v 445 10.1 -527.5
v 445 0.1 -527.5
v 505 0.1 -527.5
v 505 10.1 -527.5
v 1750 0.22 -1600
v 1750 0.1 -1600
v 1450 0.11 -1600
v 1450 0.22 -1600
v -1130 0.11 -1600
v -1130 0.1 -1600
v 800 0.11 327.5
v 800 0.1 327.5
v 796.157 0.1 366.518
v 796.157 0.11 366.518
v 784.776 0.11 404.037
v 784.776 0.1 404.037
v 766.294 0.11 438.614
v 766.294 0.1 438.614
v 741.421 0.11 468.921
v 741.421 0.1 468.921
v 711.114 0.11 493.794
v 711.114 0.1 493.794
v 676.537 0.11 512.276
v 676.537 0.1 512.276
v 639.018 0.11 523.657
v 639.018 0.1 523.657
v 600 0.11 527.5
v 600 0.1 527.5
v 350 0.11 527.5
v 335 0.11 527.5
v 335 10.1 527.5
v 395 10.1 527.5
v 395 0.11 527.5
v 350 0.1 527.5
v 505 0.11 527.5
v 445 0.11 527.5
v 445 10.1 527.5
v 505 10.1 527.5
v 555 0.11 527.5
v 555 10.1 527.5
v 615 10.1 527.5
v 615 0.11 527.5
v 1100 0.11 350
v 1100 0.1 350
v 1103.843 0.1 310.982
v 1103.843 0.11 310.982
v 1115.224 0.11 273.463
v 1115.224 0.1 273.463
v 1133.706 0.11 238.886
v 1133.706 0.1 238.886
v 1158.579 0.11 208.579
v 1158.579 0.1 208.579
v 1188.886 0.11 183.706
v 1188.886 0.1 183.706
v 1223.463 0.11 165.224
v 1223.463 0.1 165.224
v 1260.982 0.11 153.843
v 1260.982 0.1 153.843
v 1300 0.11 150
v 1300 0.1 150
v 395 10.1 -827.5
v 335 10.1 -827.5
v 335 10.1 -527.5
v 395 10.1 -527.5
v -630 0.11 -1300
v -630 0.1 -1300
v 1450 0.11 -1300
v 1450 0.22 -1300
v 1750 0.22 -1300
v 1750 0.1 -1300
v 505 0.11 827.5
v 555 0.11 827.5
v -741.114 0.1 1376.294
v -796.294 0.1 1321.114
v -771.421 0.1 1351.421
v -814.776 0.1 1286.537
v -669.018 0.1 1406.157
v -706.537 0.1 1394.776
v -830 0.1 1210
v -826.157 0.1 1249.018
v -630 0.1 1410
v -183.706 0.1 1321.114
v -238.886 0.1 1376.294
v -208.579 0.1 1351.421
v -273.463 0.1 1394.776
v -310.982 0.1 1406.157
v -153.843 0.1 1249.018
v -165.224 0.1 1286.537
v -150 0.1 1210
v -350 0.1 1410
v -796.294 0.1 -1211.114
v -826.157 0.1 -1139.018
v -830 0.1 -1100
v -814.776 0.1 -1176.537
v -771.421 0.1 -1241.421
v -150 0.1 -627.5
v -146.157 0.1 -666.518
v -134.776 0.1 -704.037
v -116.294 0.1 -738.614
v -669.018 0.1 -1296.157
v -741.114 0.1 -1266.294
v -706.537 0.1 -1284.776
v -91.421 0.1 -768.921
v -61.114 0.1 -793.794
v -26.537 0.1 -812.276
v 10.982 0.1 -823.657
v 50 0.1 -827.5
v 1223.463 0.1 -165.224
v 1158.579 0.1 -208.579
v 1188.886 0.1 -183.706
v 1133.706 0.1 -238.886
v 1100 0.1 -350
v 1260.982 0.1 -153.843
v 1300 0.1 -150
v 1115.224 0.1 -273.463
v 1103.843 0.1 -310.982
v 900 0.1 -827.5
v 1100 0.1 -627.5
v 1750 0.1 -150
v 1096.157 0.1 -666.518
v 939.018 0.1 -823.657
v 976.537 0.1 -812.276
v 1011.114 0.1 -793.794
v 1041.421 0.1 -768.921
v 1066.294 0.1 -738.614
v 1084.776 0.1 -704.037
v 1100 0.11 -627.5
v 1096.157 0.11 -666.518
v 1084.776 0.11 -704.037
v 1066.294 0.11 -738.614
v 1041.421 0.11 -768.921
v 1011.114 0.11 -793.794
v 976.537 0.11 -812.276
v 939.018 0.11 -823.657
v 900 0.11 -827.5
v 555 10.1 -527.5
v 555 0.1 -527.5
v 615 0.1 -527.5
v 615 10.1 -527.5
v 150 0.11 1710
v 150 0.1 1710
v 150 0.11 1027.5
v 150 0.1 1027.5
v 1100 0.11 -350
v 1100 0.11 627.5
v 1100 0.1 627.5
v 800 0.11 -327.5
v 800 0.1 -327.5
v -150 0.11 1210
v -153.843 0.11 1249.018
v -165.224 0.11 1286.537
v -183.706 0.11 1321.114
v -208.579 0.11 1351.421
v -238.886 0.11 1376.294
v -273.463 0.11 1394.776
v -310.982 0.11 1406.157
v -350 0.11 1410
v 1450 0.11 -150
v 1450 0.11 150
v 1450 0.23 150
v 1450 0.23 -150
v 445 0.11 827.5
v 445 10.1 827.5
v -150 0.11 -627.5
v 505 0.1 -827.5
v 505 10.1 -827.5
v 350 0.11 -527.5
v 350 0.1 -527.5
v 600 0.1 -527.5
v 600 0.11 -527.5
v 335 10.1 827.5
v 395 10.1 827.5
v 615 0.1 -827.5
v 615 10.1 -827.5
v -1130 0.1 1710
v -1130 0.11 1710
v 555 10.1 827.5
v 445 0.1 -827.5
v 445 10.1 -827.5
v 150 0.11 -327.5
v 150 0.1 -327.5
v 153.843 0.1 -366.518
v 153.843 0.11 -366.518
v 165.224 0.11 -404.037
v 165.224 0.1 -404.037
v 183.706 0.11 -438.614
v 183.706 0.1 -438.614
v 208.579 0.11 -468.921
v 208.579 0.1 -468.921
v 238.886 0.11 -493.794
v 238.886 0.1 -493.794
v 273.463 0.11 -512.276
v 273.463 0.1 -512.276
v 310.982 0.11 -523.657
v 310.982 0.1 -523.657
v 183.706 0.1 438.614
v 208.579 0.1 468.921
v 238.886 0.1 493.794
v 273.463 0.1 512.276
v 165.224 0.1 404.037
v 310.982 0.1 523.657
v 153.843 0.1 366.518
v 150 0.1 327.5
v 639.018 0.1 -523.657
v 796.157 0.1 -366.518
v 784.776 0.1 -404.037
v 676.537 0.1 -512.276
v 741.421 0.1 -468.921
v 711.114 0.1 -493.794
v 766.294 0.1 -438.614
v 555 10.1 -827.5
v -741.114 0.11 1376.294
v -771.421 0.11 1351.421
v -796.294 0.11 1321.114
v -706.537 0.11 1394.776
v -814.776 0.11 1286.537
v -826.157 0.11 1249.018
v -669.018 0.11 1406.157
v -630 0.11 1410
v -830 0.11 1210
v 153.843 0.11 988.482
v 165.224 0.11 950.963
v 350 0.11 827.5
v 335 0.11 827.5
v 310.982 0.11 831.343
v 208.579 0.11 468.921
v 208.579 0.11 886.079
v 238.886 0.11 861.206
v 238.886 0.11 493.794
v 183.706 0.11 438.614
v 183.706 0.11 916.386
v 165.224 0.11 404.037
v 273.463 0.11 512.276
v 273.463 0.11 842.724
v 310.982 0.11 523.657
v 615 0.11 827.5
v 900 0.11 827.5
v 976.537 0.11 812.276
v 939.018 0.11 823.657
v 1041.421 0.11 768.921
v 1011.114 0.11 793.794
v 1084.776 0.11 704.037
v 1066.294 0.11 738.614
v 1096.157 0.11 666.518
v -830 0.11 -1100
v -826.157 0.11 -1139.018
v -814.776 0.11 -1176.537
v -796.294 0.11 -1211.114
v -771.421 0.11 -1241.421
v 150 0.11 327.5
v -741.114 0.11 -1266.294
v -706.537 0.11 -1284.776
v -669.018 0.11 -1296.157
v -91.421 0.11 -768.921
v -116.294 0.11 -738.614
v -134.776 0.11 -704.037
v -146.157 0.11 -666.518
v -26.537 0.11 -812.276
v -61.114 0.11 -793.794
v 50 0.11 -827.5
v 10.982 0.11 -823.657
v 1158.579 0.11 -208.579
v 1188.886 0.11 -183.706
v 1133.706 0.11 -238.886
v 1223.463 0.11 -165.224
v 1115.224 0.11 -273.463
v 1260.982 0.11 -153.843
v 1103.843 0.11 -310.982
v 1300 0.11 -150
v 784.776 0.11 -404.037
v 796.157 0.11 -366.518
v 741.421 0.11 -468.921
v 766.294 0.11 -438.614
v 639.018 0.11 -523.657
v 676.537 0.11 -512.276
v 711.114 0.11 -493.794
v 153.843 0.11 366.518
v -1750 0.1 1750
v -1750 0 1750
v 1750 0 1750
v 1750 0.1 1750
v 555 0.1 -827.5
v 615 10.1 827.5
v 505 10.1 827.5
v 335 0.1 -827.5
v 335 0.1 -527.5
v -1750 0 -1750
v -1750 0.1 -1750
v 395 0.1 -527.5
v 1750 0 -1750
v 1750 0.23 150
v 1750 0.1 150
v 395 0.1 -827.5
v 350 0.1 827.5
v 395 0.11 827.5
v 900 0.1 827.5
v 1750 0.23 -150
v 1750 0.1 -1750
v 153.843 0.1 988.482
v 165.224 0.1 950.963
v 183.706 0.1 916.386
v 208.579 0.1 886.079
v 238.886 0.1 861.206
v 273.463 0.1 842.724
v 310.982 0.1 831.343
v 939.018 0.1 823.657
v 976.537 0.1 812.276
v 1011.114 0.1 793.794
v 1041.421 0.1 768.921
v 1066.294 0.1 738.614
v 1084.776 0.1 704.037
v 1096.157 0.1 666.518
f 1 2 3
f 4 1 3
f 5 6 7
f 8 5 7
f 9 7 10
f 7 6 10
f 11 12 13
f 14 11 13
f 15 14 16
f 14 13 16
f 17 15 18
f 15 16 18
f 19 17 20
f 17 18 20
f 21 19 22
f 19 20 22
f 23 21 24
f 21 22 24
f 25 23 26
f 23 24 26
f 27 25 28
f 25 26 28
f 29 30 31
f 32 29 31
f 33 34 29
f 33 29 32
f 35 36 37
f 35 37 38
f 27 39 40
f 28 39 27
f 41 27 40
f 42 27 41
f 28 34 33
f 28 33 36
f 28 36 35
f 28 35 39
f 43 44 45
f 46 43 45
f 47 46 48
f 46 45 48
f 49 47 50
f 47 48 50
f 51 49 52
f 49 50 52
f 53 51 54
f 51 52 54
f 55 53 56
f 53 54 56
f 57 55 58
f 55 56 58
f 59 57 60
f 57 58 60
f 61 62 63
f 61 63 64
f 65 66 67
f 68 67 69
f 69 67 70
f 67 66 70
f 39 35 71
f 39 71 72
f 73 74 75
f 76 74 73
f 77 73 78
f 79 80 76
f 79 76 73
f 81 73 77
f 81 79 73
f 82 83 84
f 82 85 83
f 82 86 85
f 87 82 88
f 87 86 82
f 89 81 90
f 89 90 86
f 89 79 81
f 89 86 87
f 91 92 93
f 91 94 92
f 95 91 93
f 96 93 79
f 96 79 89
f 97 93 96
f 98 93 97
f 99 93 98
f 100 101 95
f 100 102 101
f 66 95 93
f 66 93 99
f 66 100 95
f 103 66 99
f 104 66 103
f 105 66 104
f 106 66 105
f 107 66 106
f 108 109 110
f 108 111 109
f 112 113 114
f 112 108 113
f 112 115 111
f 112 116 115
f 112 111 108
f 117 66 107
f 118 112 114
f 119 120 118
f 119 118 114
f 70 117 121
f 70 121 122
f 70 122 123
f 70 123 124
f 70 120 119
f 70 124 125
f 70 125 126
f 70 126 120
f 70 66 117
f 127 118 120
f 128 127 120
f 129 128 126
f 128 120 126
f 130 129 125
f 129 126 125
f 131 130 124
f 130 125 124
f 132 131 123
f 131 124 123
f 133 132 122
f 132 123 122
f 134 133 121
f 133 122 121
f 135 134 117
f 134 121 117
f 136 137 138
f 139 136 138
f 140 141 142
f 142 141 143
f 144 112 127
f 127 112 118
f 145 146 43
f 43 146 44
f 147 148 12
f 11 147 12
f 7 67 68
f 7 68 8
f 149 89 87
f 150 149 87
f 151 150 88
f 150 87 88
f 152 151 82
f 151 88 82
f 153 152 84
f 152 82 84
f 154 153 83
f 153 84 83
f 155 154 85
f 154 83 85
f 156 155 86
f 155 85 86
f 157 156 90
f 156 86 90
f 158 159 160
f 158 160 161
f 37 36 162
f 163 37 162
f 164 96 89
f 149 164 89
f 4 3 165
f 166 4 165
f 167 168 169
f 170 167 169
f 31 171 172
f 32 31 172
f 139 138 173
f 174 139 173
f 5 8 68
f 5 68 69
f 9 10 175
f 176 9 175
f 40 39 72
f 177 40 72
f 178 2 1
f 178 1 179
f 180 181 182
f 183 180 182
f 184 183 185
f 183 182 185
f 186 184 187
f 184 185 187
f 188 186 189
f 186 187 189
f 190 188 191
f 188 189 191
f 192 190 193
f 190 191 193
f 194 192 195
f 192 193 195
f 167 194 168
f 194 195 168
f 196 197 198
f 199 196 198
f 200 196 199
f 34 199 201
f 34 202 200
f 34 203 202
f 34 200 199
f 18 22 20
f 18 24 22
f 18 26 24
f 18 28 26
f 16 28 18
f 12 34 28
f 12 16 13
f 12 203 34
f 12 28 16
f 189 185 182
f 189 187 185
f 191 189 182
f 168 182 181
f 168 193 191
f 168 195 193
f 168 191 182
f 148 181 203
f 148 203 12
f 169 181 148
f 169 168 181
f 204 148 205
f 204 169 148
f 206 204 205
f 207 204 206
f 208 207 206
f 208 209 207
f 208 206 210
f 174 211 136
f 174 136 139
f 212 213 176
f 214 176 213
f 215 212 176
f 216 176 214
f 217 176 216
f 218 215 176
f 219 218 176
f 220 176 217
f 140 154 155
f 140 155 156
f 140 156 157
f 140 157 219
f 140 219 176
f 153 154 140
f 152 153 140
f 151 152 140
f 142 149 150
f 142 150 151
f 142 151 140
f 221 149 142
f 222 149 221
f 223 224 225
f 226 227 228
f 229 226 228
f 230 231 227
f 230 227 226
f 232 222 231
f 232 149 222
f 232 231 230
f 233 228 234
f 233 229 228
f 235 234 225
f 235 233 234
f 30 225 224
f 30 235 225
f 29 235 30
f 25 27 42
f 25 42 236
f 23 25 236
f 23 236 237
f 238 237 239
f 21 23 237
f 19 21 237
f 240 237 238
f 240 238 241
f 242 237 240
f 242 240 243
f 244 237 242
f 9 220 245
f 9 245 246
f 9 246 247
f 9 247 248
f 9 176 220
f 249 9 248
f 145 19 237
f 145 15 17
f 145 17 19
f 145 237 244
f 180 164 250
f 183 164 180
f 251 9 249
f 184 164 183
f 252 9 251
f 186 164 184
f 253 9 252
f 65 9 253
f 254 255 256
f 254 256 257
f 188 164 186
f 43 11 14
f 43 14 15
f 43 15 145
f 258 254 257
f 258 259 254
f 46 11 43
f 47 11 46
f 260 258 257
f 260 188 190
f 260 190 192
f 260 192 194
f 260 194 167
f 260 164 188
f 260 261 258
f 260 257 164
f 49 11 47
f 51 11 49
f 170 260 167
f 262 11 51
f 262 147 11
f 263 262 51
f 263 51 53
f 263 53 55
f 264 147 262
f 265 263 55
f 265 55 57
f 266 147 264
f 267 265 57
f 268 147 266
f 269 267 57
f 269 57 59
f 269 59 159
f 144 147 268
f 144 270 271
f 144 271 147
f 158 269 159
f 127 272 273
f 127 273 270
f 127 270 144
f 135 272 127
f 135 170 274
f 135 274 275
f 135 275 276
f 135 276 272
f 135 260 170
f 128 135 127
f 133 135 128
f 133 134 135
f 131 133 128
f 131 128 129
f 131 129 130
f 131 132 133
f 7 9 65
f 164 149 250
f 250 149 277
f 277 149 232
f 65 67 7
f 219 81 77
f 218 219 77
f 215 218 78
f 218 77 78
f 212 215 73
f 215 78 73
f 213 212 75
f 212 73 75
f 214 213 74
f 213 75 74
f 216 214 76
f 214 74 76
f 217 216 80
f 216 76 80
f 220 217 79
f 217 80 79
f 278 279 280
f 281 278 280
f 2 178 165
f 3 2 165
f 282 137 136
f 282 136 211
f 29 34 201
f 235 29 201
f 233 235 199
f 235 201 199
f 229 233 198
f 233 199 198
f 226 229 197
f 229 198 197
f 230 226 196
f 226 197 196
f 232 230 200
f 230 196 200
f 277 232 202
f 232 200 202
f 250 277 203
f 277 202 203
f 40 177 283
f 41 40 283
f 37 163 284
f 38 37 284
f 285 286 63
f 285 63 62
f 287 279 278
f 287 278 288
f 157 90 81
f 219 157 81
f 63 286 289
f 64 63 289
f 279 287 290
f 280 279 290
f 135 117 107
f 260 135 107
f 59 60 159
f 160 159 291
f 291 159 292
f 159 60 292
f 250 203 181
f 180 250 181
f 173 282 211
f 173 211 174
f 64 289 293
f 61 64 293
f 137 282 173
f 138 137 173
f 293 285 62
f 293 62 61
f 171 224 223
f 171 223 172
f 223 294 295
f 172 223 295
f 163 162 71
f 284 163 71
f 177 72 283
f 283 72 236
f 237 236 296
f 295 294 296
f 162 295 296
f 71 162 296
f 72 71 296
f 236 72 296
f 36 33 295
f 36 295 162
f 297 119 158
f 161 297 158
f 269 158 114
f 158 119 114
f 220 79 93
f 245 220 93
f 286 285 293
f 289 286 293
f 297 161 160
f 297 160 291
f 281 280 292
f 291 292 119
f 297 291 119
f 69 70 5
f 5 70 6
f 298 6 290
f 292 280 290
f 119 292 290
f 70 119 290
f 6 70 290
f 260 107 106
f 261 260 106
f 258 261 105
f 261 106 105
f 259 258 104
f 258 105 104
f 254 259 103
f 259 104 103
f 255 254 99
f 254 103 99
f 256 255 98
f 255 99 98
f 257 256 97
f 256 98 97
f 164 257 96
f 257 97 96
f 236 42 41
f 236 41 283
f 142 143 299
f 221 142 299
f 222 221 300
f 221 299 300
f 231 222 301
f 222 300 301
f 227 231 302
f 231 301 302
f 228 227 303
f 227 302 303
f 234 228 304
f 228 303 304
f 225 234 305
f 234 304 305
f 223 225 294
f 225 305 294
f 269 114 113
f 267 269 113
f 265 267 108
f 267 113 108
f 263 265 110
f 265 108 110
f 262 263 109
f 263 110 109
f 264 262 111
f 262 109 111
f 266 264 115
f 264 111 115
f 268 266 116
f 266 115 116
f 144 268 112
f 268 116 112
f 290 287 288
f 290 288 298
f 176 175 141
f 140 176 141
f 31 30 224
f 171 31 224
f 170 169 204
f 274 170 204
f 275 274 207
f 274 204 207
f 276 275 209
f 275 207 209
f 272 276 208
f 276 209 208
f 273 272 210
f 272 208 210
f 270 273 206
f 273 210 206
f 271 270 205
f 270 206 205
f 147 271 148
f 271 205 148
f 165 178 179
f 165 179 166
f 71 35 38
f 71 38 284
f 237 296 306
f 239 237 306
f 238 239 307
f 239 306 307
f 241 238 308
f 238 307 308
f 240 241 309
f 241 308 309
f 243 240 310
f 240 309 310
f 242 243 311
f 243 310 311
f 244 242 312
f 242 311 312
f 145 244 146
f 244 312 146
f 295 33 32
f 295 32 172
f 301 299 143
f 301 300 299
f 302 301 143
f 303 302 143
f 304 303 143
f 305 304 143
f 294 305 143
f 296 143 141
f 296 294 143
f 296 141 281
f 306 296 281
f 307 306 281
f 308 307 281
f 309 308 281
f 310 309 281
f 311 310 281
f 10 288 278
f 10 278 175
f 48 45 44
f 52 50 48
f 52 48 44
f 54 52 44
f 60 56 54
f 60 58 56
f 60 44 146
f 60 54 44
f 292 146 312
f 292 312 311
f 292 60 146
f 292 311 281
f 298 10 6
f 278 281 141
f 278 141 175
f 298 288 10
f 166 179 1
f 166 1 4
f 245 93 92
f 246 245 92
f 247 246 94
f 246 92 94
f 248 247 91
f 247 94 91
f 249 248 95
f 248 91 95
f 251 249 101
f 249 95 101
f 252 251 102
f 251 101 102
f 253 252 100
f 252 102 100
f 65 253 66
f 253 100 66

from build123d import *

# Parameters (mm, degrees)
SKETCH_2_W        = 3500
SKETCH_2_H        = 3500
EXTRUDE_1_DEPTH   = 0.1
EXTRUDE_3_DEPTH   = 0.11
SKETCH_4_W        = 300
SKETCH_4_H        = 300
EXTRUDE_4_DEPTH   = 0.12
SKETCH_5_W        = 300
SKETCH_5_H        = 300
EXTRUDE_5_DEPTH   = 0.13
SKETCH_6_W        = 60
SKETCH_6_H        = 300
EXTRUDE_6_DEPTH   = 10
EXTRUDE_6_2_DEPTH = 10
EXTRUDE_6_3_DEPTH = 10


with BuildPart() as part:
    # 草图2 → 凸台-拉伸1 (new body)
    with BuildSketch(Plane(origin=(0, 0, 0), x_dir=(1, 0, 0), z_dir=(0, 1, 0))):
        Rectangle(SKETCH_2_W, SKETCH_2_H)
    extrude(amount=EXTRUDE_1_DEPTH)

    # 草图3 → 凸台-拉伸3 (add)
    with BuildSketch(Plane(origin=(0, 0, 0), x_dir=(1, 0, 0), z_dir=(0, 1, 0))):
        with BuildLine():
            Line((1750, 1600), (-1130, 1600))
            Line((-1130, 1600), (-1130, -1710))
            Line((-1130, -1710), (150, -1710))
            Line((150, -1710), (150, -1027.5))
            ThreePointArc((150, -1027.5), (208.578643763, -886.078643763), (350, -827.5))
            Line((350, -827.5), (900, -827.5))
            ThreePointArc((900, -827.5), (1041.421356237, -768.921356237), (1100, -627.5))
            Line((1100, -627.5), (1100, -350))
            ThreePointArc((1100, -350), (1158.578643763, -208.578643763), (1300, -150))
            Line((1300, -150), (1750, -150))
            Line((1750, -150), (1750, 150))
            Line((1750, 150), (1300, 150))
            ThreePointArc((1300, 150), (1158.578643763, 208.578643763), (1100, 350))
            Line((1100, 350), (1100, 627.5))
            ThreePointArc((1100, 627.5), (1041.421356237, 768.921356237), (900, 827.5))
            Line((900, 827.5), (50, 827.5))
            ThreePointArc((50, 827.5), (-91.421356237, 768.921356237), (-150, 627.5))
            Line((-150, 627.5), (-150, -1210))
            ThreePointArc((-150, -1210), (-208.578643763, -1351.421356237), (-350, -1410))
            Line((-350, -1410), (-630, -1410))
            ThreePointArc((-630, -1410), (-771.421356237, -1351.421356237), (-830, -1210))
            Line((-830, -1210), (-830, 1100))
            ThreePointArc((-830, 1100), (-771.421356237, 1241.421356237), (-630, 1300))
            Line((-630, 1300), (1750, 1300))
            Line((1750, 1300), (1750, 1600))
        make_face()
        with BuildLine():
            Line((350, 527.5), (600, 527.5))
            ThreePointArc((600, 527.5), (741.421356237, 468.921356237), (800, 327.5))
            Line((800, 327.5), (800, -327.5))
            ThreePointArc((800, -327.5), (741.421356237, -468.921356237), (600, -527.5))
            Line((600, -527.5), (350, -527.5))
            ThreePointArc((350, -527.5), (208.578643763, -468.921356237), (150, -327.5))
            Line((150, -327.5), (150, 327.5))
            ThreePointArc((150, 327.5), (208.578643763, 468.921356237), (350, 527.5))
        make_face(mode=Mode.SUBTRACT)
    extrude(amount=EXTRUDE_3_DEPTH)

    # 草图4 → 凸台-拉伸4 (add)
    with BuildSketch(Plane(origin=(0, 0.1, 0), x_dir=(1, 0, 0), z_dir=(0, 1, 0))):
        with Locations((1600, 1450)):
            Rectangle(SKETCH_4_W, SKETCH_4_H)
    extrude(amount=EXTRUDE_4_DEPTH)

    # 草图5 → 凸台-拉伸5 (add)
    with BuildSketch(Plane(origin=(0, 0.1, 0), x_dir=(1, 0, 0), z_dir=(0, 1, 0))):
        with Locations((1600, 0)):
            Rectangle(SKETCH_5_W, SKETCH_5_H)
    extrude(amount=EXTRUDE_5_DEPTH)


with BuildPart() as body_2:
    # 草图6 → 凸台-拉伸6 (new body)
    with BuildSketch(Plane(origin=(-425.822723821, 0.1, 0), x_dir=(1, 0, 0), z_dir=(0, 1, 0))):
        with Locations((900.822723821, 677.5)):
            Rectangle(SKETCH_6_W, SKETCH_6_H)
    extrude_6 = extrude(amount=EXTRUDE_6_DEPTH)


with BuildPart() as body_3:
    # 草图6 → Extrude 6 2 (new body)
    with BuildSketch(Plane(origin=(-425.822723821, 0.1, 0), x_dir=(1, 0, 0), z_dir=(0, 1, 0))):
        with Locations((1010.822723821, 677.5)):
            Rectangle(SKETCH_6_W, SKETCH_6_H)
    extrude_6_2 = extrude(amount=EXTRUDE_6_2_DEPTH)


with BuildPart() as body_4:
    # 草图6 → Extrude 6 3 (new body)
    with BuildSketch(Plane(origin=(-425.822723821, 0.1, 0), x_dir=(1, 0, 0), z_dir=(0, 1, 0))):
        with Locations((790.822723821, 677.5)):
            Rectangle(SKETCH_6_W, SKETCH_6_H)
    extrude_6_3 = extrude(amount=EXTRUDE_6_3_DEPTH)


with BuildPart() as part_1:
    add(part.part)

    # 镜向1: 凸台-拉伸6, Extrude 6 2, Extrude 6 3 across plane
    add(extrude_6.mirror(Plane.XY))
    add(extrude_6_2.mirror(Plane.XY))
    add(extrude_6_3.mirror(Plane.XY))


solid = Compound([body_2.part, body_3.part, body_4.part, part_1.part])
